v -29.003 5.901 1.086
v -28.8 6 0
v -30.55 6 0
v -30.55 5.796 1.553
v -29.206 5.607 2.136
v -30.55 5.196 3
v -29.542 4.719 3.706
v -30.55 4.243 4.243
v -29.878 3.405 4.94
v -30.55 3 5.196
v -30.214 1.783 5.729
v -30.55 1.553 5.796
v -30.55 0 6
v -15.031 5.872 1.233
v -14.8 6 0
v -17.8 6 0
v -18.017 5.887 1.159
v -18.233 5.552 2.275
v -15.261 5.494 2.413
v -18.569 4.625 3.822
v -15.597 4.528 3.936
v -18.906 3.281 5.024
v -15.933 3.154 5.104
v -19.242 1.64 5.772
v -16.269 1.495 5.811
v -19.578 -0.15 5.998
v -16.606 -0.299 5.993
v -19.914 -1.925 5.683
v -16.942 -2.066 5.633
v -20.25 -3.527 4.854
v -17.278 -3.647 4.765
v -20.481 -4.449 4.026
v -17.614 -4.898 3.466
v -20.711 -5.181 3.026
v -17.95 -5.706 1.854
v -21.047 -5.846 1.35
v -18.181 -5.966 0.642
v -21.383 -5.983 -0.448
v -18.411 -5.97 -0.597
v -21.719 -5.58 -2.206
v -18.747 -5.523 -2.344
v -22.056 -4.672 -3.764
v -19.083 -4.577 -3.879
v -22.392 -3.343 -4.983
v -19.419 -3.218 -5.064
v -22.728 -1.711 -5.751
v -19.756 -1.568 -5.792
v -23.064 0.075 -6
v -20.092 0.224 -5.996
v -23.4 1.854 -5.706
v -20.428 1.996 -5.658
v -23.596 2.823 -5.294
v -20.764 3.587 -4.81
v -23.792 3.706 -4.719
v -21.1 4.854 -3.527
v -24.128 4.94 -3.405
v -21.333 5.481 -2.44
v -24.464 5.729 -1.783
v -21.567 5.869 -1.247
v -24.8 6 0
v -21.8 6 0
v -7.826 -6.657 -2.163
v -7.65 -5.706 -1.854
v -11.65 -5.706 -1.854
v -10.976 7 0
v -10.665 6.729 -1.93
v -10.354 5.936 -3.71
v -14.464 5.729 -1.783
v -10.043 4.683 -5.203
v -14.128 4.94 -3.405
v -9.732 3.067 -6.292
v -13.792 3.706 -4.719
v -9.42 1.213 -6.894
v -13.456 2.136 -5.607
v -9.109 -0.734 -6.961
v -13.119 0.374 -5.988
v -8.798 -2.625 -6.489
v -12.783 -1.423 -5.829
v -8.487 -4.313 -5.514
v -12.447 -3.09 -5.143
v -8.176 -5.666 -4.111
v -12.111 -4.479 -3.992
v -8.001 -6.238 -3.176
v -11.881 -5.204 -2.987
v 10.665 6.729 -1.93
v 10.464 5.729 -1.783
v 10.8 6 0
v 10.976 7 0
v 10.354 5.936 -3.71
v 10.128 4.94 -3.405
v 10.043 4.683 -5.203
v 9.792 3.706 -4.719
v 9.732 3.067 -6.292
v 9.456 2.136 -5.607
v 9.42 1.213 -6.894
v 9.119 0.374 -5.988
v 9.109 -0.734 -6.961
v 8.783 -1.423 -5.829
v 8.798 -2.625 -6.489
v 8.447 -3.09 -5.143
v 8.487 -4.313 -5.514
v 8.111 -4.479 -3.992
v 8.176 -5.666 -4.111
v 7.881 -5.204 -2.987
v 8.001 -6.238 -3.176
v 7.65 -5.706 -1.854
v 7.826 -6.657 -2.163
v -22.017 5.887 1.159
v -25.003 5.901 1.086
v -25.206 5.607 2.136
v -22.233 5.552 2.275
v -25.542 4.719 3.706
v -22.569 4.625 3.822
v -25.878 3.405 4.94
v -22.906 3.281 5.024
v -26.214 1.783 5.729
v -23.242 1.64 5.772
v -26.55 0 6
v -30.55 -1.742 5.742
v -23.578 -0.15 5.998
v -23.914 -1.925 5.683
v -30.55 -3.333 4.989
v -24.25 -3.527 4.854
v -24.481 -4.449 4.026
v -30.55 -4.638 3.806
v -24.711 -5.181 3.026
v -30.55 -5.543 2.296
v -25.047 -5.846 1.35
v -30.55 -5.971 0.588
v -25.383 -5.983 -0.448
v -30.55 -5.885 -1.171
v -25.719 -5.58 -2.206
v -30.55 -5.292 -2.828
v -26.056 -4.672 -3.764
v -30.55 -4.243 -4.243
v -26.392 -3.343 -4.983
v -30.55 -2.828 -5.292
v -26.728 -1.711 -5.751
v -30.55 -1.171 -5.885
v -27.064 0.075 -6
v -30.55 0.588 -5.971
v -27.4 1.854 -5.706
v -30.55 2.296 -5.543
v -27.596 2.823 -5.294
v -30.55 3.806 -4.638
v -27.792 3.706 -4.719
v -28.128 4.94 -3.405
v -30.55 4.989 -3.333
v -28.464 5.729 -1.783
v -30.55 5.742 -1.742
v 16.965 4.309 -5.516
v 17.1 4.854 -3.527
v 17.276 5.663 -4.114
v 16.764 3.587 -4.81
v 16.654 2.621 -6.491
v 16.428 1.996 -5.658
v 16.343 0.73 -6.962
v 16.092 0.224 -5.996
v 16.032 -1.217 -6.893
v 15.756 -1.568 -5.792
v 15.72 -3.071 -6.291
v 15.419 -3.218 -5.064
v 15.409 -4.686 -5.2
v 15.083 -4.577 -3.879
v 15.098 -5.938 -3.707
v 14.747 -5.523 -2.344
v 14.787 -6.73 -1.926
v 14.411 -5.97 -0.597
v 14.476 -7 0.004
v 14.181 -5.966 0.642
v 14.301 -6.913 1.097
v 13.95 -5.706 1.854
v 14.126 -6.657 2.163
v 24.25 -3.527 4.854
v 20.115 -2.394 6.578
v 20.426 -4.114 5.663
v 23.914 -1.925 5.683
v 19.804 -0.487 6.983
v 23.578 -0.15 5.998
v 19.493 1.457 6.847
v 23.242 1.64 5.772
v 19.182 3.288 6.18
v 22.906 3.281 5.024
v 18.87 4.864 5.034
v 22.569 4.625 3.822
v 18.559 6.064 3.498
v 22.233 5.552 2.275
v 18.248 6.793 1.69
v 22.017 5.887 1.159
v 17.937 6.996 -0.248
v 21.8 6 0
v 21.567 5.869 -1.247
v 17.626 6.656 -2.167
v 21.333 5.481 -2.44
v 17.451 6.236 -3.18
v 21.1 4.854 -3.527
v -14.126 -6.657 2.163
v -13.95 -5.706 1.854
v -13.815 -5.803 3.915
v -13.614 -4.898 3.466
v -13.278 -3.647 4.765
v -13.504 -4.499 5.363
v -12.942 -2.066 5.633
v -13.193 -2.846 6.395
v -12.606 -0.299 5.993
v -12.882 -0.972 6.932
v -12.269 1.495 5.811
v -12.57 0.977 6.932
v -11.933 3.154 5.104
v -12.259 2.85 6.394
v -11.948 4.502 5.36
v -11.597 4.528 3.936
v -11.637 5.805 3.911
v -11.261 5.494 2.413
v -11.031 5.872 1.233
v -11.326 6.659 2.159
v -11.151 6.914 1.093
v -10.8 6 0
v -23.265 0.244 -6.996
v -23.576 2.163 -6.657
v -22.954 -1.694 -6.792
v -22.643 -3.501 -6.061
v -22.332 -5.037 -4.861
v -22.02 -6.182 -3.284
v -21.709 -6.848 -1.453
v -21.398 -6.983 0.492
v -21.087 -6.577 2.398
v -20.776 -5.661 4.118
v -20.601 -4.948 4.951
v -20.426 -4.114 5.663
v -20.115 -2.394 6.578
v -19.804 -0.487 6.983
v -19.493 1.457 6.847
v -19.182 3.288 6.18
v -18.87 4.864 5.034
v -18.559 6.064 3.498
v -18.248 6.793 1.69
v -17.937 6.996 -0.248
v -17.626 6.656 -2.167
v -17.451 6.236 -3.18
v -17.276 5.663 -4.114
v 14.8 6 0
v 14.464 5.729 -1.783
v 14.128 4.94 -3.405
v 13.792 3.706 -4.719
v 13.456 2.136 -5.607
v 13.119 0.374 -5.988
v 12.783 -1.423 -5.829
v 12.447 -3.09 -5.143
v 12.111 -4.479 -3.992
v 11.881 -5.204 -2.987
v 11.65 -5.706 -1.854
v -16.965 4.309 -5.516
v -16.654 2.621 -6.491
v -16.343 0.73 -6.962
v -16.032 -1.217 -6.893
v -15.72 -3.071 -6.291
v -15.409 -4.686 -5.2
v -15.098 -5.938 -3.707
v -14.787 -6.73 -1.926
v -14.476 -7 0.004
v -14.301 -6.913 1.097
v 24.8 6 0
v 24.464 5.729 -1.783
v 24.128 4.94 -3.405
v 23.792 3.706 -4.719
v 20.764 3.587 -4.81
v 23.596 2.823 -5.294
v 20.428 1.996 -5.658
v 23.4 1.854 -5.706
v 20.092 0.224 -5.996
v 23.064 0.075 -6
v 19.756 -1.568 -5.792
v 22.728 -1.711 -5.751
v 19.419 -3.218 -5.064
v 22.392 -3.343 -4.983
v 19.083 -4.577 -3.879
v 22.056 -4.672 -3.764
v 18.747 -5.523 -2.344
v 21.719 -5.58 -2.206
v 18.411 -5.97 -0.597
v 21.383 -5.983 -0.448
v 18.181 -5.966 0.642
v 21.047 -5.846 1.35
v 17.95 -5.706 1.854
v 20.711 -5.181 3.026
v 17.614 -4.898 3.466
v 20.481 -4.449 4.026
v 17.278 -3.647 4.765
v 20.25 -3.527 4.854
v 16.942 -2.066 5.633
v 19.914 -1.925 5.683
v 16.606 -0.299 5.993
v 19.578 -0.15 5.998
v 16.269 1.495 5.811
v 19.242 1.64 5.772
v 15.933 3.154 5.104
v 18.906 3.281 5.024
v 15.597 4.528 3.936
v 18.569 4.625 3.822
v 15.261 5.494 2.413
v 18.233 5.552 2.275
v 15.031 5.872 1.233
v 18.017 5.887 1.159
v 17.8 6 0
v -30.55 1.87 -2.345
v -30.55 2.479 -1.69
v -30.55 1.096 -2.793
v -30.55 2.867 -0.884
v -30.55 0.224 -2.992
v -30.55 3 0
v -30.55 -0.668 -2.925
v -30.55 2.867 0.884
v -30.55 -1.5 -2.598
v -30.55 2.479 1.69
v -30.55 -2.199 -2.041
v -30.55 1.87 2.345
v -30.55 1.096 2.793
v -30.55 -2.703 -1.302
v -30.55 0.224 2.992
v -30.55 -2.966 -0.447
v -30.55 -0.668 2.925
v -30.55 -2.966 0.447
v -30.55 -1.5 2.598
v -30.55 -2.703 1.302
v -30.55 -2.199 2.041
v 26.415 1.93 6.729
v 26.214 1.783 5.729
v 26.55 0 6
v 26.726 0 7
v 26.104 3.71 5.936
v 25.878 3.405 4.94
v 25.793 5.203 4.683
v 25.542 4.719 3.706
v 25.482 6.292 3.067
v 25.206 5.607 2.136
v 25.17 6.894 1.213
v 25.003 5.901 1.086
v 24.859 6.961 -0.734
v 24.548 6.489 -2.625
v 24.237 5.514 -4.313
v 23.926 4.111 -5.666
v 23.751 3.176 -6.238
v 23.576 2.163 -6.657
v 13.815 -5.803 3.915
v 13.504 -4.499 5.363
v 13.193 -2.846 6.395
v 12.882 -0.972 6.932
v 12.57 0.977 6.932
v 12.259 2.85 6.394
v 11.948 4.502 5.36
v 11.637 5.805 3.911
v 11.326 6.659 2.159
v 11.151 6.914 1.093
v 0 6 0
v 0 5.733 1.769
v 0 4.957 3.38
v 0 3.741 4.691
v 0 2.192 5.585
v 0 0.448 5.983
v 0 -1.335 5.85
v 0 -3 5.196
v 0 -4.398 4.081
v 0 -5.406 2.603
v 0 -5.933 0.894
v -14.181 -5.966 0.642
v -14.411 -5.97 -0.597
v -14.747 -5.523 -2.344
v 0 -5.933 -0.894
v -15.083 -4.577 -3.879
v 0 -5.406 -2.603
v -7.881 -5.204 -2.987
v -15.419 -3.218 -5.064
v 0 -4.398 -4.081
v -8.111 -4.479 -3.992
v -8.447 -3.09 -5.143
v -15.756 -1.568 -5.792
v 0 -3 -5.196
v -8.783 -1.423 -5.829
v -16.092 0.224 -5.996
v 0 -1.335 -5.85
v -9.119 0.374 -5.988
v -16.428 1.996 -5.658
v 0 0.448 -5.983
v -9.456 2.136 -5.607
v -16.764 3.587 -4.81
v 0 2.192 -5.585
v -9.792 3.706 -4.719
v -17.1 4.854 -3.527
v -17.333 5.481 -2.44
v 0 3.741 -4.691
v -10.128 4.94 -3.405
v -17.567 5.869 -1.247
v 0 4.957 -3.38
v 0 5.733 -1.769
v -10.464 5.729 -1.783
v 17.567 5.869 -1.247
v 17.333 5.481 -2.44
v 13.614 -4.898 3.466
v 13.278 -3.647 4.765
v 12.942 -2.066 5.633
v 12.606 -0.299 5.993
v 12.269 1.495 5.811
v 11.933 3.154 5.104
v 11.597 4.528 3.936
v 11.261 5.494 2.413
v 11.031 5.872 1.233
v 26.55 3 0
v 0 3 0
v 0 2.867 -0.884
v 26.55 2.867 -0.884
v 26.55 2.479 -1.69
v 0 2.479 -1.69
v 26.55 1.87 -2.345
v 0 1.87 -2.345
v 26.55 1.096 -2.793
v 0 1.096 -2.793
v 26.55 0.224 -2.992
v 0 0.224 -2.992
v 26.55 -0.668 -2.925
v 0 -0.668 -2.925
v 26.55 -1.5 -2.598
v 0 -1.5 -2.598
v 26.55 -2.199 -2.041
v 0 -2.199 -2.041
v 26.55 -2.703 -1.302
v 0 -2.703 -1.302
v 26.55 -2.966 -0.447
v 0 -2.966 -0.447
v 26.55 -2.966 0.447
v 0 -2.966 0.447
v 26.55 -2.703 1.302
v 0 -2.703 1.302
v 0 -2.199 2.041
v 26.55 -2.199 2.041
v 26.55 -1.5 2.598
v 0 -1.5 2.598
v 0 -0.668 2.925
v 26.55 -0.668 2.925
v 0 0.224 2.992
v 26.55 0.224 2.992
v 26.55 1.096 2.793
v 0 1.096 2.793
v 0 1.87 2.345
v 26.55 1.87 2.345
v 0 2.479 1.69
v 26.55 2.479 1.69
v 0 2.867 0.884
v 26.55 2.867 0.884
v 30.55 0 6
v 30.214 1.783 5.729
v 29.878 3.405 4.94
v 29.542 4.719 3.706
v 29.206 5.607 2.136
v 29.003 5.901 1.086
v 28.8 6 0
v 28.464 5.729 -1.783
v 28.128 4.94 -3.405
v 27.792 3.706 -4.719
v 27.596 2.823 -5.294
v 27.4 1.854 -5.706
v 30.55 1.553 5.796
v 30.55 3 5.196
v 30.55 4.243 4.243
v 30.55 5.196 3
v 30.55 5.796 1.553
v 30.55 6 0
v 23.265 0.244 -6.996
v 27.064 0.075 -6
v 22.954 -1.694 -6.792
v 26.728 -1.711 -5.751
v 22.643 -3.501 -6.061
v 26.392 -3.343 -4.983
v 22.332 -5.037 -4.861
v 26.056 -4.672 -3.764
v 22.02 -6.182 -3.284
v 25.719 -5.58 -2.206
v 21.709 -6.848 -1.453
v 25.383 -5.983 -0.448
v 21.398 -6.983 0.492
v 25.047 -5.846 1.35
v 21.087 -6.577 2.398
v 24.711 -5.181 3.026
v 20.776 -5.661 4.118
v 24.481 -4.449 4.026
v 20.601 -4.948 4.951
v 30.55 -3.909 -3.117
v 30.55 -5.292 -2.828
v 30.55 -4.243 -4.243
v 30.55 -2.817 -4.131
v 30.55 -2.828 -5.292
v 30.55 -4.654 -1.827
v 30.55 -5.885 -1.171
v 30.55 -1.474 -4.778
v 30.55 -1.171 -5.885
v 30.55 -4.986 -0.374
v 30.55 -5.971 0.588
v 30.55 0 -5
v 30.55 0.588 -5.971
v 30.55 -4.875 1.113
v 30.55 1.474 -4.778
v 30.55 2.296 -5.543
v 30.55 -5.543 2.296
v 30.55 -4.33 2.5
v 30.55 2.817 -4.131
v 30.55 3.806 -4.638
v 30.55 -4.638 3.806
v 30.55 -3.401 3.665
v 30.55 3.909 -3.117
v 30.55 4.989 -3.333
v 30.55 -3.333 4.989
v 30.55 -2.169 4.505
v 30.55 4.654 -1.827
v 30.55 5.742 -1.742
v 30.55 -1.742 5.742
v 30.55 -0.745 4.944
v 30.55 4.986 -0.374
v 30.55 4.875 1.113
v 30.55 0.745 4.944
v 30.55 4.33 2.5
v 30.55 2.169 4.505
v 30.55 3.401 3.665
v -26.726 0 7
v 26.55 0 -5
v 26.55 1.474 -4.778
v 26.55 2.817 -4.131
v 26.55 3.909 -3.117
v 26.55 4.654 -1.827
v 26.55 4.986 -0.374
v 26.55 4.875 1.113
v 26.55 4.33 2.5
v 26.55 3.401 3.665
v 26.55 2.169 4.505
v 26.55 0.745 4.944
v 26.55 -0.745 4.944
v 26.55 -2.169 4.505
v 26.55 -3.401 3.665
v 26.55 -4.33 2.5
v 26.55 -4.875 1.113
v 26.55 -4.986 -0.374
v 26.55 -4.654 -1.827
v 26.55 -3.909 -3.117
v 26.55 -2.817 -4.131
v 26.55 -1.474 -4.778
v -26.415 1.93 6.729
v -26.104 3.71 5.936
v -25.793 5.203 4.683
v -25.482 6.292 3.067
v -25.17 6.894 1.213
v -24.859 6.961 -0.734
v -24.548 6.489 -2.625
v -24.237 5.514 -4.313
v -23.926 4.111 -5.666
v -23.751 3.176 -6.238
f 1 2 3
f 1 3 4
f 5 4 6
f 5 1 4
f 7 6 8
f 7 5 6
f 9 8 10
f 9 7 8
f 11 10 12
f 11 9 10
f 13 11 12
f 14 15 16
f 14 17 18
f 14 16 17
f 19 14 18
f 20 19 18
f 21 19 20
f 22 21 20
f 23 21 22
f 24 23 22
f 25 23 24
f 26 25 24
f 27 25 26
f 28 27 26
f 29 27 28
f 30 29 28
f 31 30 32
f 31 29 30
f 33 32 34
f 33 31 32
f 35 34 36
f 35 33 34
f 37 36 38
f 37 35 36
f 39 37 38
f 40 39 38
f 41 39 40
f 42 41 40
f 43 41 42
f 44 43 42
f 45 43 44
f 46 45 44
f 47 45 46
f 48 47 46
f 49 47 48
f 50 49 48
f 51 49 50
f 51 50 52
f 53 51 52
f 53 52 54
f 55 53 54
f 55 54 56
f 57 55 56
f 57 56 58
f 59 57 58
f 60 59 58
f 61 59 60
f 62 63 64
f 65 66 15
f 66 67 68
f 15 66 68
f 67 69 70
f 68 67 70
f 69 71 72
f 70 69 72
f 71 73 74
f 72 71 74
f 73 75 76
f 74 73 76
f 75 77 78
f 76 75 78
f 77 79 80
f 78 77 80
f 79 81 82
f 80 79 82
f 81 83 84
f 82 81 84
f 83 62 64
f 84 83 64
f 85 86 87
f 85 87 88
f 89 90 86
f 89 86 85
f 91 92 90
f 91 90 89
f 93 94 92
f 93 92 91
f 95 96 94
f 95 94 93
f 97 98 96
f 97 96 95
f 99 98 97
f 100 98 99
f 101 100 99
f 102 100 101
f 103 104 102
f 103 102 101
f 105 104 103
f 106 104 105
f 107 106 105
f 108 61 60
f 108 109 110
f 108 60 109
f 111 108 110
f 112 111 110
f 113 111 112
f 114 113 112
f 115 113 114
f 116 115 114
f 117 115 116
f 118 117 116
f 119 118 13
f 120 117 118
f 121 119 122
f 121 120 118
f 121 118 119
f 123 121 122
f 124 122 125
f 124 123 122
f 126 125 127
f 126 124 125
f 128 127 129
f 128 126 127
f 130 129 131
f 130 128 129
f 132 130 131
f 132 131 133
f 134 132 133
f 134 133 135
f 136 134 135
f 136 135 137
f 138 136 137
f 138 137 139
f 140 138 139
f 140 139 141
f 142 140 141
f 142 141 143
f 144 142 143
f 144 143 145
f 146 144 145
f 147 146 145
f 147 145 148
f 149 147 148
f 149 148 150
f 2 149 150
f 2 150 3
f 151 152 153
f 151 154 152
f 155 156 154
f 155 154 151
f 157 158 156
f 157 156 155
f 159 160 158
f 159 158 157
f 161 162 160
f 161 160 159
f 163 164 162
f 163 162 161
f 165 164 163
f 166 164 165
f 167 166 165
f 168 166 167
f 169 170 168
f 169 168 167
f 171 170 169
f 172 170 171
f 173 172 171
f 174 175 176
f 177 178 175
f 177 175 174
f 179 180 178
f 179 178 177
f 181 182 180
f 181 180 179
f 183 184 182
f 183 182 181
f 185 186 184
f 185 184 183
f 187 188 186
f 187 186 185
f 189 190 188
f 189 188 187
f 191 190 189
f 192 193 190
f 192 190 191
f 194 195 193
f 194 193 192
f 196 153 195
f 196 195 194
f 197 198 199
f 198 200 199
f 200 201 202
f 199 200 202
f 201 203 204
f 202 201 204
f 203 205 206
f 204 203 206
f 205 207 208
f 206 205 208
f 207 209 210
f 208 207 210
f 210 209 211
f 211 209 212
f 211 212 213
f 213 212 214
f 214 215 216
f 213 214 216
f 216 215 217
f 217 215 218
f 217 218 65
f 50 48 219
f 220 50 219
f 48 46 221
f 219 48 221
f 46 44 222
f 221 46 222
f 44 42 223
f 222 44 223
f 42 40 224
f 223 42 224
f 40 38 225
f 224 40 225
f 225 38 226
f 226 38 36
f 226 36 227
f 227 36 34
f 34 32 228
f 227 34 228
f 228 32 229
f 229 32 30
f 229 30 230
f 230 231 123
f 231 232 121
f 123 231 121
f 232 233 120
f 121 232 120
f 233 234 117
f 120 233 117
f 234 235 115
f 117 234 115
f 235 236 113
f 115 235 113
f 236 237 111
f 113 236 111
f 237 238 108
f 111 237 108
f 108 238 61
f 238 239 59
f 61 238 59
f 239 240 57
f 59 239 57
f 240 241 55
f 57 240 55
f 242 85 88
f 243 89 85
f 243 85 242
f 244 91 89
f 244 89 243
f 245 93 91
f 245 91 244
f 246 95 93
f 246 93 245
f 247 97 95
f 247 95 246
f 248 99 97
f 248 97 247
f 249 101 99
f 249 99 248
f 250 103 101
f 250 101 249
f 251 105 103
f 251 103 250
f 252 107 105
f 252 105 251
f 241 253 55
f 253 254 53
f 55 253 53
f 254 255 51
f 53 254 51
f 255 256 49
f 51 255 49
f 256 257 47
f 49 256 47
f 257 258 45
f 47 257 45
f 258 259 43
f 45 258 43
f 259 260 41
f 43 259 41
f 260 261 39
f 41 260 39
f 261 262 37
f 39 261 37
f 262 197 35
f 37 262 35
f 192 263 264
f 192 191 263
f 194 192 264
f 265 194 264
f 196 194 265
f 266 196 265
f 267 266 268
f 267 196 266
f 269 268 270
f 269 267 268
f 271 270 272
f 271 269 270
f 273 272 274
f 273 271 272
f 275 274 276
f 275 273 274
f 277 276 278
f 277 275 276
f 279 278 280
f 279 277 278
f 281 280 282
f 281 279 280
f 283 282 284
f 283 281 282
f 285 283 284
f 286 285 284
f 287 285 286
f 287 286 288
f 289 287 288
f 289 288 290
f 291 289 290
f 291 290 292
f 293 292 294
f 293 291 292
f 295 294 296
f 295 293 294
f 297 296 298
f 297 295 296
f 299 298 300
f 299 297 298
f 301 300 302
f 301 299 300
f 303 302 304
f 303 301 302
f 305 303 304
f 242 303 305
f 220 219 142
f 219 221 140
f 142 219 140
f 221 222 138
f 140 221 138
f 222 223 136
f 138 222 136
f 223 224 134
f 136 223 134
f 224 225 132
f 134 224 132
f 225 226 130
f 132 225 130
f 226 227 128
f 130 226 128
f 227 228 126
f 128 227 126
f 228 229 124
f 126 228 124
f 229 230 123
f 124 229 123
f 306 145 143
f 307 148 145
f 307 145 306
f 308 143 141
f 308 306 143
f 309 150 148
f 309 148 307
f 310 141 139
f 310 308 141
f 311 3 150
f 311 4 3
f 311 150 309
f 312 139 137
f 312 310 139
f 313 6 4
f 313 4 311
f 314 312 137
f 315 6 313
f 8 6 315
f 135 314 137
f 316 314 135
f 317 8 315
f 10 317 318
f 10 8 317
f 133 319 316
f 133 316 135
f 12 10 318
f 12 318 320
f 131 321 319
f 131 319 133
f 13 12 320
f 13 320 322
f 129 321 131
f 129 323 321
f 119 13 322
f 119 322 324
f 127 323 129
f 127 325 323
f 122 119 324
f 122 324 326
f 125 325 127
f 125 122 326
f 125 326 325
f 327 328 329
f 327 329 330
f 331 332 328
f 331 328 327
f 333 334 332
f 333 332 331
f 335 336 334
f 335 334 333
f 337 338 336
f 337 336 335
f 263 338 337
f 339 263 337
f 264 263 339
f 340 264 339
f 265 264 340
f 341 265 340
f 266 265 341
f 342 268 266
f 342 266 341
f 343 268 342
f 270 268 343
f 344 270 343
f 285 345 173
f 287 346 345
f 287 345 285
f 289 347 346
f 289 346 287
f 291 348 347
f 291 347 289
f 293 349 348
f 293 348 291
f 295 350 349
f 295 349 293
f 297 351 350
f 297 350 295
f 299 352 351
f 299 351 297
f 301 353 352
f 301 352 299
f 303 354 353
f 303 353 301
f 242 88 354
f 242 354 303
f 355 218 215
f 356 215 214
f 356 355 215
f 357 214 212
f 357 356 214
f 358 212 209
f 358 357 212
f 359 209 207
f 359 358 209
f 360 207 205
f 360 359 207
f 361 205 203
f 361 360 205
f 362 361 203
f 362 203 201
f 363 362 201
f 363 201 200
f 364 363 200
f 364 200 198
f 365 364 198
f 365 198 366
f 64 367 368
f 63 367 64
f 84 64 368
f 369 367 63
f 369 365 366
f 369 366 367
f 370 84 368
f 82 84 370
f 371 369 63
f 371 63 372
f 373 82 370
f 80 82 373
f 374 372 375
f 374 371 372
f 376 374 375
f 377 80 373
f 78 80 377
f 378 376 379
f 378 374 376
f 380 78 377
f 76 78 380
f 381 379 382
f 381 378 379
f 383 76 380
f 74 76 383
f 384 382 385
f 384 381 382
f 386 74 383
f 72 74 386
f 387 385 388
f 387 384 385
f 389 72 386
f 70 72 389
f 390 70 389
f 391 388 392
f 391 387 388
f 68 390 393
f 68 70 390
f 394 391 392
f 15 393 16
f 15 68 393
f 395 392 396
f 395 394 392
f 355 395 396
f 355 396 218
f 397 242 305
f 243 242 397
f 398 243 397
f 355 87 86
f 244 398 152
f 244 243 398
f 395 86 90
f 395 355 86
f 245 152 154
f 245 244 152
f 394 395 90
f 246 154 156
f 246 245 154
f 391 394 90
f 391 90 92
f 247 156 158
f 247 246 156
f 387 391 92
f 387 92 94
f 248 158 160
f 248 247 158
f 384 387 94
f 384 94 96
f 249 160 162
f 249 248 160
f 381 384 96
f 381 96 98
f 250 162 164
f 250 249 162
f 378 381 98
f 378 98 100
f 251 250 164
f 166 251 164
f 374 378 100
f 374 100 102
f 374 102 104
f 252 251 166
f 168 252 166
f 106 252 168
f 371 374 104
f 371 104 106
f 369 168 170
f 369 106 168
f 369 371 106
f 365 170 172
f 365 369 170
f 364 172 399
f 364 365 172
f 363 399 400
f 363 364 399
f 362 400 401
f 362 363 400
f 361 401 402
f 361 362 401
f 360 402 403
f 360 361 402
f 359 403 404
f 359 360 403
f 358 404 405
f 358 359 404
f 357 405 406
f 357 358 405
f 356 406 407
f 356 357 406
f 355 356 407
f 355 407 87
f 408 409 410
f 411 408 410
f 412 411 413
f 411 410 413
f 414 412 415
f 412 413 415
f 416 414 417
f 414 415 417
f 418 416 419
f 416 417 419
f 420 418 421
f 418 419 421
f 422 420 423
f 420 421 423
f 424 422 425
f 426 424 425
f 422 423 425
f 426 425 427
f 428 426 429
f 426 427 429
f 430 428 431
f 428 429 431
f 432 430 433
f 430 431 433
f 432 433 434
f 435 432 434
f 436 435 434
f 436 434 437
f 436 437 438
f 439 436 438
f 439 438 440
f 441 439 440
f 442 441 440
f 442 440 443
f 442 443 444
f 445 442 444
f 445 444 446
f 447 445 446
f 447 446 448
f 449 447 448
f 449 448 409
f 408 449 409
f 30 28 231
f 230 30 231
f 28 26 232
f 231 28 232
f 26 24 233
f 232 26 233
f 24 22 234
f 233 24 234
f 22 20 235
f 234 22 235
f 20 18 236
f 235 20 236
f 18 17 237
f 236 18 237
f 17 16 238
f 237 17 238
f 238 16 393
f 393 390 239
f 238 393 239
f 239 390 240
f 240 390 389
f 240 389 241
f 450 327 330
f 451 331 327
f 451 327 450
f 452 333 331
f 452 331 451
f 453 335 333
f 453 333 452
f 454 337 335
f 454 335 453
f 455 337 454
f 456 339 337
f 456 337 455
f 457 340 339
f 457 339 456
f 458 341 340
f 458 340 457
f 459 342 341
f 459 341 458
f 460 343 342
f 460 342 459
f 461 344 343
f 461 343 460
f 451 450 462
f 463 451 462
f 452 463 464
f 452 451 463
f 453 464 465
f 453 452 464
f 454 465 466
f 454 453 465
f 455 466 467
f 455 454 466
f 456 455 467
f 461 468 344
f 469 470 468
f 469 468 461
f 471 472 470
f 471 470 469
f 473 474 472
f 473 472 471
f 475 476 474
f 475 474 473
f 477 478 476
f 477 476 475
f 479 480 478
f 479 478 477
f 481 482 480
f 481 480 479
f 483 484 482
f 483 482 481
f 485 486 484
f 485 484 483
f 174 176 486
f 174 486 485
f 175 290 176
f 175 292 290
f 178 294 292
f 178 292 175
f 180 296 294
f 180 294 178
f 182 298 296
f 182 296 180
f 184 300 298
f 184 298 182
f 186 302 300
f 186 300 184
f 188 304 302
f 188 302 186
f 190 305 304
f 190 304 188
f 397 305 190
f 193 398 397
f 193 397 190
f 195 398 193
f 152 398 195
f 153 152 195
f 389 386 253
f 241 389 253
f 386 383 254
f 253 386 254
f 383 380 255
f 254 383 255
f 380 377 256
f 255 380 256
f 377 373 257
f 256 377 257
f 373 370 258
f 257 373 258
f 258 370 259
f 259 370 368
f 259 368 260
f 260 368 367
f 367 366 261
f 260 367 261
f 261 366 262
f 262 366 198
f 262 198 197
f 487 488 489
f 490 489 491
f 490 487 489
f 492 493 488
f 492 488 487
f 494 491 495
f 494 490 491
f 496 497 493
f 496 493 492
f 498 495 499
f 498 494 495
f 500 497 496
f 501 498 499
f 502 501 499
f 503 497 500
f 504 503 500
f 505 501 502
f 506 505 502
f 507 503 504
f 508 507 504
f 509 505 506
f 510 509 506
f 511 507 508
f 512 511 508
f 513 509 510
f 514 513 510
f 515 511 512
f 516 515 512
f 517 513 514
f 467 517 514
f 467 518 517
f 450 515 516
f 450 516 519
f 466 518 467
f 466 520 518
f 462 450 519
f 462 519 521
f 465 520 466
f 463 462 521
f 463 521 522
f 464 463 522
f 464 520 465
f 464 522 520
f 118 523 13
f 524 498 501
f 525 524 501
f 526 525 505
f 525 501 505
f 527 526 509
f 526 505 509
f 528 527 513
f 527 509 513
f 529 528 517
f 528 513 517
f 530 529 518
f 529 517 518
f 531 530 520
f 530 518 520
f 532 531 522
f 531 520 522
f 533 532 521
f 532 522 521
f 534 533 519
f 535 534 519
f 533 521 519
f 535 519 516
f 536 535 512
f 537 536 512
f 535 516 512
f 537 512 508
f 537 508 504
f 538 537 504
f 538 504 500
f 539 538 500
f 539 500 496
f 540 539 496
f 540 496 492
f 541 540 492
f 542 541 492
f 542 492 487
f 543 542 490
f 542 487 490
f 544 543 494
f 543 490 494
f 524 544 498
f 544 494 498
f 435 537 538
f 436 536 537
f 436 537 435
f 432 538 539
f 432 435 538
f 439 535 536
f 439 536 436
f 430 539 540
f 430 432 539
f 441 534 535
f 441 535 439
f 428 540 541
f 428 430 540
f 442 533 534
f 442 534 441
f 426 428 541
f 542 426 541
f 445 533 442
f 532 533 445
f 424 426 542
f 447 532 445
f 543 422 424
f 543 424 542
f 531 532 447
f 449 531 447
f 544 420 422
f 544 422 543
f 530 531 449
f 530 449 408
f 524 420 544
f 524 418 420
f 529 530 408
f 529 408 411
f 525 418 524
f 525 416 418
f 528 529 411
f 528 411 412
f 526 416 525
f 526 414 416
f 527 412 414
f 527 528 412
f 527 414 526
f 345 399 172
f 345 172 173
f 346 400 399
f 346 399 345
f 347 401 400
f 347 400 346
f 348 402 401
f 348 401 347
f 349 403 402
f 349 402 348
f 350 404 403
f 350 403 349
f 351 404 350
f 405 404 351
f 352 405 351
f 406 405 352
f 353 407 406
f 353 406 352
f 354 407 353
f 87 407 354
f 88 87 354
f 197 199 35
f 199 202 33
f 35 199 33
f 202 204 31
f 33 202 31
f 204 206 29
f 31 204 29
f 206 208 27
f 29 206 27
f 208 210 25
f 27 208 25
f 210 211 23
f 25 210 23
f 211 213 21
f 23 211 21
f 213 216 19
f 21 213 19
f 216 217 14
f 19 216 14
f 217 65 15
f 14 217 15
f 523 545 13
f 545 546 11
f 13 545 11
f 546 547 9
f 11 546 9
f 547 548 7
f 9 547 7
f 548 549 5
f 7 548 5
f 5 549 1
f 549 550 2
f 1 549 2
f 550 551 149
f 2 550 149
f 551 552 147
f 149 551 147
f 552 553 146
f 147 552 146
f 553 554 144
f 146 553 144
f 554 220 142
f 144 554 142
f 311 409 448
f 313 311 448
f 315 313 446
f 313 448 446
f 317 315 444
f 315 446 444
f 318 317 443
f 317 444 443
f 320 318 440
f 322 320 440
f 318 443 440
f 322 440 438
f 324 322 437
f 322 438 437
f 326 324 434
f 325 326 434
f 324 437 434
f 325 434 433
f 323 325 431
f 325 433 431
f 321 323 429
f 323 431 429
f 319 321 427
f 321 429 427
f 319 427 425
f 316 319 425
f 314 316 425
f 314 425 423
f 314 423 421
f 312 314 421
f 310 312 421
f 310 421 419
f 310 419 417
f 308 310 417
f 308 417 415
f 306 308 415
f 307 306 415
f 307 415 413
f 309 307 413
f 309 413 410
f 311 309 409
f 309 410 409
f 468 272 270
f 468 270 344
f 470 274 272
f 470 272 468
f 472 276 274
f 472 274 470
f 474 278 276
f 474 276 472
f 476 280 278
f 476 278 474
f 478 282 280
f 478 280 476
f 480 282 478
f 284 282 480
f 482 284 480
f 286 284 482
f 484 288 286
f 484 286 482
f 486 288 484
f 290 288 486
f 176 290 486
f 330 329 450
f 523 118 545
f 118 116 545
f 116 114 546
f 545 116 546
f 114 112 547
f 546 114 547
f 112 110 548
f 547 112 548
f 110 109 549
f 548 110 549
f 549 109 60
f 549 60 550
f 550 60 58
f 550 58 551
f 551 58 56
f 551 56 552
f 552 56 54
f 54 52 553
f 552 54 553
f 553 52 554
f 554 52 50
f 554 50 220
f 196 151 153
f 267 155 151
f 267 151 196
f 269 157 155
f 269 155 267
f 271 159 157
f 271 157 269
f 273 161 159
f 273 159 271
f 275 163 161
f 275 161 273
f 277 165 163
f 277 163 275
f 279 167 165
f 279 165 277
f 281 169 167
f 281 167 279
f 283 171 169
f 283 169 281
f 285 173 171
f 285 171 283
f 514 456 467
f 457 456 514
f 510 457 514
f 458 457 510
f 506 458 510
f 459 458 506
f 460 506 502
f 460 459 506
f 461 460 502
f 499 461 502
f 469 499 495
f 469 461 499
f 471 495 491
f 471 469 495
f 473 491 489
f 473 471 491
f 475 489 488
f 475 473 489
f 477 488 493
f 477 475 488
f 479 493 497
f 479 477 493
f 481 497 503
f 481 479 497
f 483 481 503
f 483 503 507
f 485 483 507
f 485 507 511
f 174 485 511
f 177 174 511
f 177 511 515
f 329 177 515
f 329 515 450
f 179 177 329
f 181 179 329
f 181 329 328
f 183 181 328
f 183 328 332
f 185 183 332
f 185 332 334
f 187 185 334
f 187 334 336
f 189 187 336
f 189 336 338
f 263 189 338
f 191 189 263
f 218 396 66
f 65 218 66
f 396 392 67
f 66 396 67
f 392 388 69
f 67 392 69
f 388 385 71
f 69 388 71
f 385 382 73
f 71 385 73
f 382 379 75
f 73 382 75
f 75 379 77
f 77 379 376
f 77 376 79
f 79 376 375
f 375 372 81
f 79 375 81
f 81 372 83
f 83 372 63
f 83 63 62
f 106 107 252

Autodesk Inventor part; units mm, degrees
ref_plane "YZ Plane" through (0, 0, 0) normal (1, 0, 0) x (0, 1, 0)
ref_plane "XZ Plane" through (0, 0, 0) normal (0, 1, 0) x (-1, 0, 0)
ref_plane "XY Plane" through (0, 0, 0) normal (0, 0, 1) x (1, 0, 0)
sketch "Skizze1" plane through (0, 0, 0) normal (1, 0, 0) x (0, 1, 0)
  circle A0 centre (0, 0) radius 6
  circle A1 centre (0, 0) radius 3
  dimension "d0" = 12
  dimension "d1" = 6
extrude "Extrusion1" add sketch "Skizze1" along normal blind 30.55
sketch "Skizze2" plane through (0, 0, 0) normal (0, 1, 0) x (-1, 0, 0)
  line L0 (-30.55, 6) -> (-30.55, -6) construction
  line L1 (-30.55, 6) -> (-30.55, -6) construction
  line L2 (-30.55, 6) -> (-26.55, 6)
  line L3 (0, 6) -> (-30.55, 6) projected
  line L4 (-30.55, 6) -> (-30.55, 6.1)
  line L5 (-30.55, 6) -> (-26.7263, 7)
  line L6 (-26.7263, 7) -> (-26.55, 6)
  point P0 (0, 0)
  dimension "d4" = 4
  dimension "d5" = 0.1
  dimension "d6" = 80
  dimension "d7" = 1
coil "Spirale1" sketch "Skizze2" operation add axis through (-10, 0, 0) along (-1, 0, 0) pitch 7 turns 2.7 hand right
mirror "Spiegeln1" about plane through (0, 0, 0) normal (1, 0, 0) of "Extrusion1", "Spirale1"
sketch "Skizze3" plane through (30.55, 0, 0) normal (1, 0, 0) x (0, 0, -1)
  circle A0 centre (0, 0) radius 5
  dimension "d16" = 10
extrude "Extrusion2" cut sketch "Skizze3" against normal blind 4
properties part number "Dribblerschnecke"
